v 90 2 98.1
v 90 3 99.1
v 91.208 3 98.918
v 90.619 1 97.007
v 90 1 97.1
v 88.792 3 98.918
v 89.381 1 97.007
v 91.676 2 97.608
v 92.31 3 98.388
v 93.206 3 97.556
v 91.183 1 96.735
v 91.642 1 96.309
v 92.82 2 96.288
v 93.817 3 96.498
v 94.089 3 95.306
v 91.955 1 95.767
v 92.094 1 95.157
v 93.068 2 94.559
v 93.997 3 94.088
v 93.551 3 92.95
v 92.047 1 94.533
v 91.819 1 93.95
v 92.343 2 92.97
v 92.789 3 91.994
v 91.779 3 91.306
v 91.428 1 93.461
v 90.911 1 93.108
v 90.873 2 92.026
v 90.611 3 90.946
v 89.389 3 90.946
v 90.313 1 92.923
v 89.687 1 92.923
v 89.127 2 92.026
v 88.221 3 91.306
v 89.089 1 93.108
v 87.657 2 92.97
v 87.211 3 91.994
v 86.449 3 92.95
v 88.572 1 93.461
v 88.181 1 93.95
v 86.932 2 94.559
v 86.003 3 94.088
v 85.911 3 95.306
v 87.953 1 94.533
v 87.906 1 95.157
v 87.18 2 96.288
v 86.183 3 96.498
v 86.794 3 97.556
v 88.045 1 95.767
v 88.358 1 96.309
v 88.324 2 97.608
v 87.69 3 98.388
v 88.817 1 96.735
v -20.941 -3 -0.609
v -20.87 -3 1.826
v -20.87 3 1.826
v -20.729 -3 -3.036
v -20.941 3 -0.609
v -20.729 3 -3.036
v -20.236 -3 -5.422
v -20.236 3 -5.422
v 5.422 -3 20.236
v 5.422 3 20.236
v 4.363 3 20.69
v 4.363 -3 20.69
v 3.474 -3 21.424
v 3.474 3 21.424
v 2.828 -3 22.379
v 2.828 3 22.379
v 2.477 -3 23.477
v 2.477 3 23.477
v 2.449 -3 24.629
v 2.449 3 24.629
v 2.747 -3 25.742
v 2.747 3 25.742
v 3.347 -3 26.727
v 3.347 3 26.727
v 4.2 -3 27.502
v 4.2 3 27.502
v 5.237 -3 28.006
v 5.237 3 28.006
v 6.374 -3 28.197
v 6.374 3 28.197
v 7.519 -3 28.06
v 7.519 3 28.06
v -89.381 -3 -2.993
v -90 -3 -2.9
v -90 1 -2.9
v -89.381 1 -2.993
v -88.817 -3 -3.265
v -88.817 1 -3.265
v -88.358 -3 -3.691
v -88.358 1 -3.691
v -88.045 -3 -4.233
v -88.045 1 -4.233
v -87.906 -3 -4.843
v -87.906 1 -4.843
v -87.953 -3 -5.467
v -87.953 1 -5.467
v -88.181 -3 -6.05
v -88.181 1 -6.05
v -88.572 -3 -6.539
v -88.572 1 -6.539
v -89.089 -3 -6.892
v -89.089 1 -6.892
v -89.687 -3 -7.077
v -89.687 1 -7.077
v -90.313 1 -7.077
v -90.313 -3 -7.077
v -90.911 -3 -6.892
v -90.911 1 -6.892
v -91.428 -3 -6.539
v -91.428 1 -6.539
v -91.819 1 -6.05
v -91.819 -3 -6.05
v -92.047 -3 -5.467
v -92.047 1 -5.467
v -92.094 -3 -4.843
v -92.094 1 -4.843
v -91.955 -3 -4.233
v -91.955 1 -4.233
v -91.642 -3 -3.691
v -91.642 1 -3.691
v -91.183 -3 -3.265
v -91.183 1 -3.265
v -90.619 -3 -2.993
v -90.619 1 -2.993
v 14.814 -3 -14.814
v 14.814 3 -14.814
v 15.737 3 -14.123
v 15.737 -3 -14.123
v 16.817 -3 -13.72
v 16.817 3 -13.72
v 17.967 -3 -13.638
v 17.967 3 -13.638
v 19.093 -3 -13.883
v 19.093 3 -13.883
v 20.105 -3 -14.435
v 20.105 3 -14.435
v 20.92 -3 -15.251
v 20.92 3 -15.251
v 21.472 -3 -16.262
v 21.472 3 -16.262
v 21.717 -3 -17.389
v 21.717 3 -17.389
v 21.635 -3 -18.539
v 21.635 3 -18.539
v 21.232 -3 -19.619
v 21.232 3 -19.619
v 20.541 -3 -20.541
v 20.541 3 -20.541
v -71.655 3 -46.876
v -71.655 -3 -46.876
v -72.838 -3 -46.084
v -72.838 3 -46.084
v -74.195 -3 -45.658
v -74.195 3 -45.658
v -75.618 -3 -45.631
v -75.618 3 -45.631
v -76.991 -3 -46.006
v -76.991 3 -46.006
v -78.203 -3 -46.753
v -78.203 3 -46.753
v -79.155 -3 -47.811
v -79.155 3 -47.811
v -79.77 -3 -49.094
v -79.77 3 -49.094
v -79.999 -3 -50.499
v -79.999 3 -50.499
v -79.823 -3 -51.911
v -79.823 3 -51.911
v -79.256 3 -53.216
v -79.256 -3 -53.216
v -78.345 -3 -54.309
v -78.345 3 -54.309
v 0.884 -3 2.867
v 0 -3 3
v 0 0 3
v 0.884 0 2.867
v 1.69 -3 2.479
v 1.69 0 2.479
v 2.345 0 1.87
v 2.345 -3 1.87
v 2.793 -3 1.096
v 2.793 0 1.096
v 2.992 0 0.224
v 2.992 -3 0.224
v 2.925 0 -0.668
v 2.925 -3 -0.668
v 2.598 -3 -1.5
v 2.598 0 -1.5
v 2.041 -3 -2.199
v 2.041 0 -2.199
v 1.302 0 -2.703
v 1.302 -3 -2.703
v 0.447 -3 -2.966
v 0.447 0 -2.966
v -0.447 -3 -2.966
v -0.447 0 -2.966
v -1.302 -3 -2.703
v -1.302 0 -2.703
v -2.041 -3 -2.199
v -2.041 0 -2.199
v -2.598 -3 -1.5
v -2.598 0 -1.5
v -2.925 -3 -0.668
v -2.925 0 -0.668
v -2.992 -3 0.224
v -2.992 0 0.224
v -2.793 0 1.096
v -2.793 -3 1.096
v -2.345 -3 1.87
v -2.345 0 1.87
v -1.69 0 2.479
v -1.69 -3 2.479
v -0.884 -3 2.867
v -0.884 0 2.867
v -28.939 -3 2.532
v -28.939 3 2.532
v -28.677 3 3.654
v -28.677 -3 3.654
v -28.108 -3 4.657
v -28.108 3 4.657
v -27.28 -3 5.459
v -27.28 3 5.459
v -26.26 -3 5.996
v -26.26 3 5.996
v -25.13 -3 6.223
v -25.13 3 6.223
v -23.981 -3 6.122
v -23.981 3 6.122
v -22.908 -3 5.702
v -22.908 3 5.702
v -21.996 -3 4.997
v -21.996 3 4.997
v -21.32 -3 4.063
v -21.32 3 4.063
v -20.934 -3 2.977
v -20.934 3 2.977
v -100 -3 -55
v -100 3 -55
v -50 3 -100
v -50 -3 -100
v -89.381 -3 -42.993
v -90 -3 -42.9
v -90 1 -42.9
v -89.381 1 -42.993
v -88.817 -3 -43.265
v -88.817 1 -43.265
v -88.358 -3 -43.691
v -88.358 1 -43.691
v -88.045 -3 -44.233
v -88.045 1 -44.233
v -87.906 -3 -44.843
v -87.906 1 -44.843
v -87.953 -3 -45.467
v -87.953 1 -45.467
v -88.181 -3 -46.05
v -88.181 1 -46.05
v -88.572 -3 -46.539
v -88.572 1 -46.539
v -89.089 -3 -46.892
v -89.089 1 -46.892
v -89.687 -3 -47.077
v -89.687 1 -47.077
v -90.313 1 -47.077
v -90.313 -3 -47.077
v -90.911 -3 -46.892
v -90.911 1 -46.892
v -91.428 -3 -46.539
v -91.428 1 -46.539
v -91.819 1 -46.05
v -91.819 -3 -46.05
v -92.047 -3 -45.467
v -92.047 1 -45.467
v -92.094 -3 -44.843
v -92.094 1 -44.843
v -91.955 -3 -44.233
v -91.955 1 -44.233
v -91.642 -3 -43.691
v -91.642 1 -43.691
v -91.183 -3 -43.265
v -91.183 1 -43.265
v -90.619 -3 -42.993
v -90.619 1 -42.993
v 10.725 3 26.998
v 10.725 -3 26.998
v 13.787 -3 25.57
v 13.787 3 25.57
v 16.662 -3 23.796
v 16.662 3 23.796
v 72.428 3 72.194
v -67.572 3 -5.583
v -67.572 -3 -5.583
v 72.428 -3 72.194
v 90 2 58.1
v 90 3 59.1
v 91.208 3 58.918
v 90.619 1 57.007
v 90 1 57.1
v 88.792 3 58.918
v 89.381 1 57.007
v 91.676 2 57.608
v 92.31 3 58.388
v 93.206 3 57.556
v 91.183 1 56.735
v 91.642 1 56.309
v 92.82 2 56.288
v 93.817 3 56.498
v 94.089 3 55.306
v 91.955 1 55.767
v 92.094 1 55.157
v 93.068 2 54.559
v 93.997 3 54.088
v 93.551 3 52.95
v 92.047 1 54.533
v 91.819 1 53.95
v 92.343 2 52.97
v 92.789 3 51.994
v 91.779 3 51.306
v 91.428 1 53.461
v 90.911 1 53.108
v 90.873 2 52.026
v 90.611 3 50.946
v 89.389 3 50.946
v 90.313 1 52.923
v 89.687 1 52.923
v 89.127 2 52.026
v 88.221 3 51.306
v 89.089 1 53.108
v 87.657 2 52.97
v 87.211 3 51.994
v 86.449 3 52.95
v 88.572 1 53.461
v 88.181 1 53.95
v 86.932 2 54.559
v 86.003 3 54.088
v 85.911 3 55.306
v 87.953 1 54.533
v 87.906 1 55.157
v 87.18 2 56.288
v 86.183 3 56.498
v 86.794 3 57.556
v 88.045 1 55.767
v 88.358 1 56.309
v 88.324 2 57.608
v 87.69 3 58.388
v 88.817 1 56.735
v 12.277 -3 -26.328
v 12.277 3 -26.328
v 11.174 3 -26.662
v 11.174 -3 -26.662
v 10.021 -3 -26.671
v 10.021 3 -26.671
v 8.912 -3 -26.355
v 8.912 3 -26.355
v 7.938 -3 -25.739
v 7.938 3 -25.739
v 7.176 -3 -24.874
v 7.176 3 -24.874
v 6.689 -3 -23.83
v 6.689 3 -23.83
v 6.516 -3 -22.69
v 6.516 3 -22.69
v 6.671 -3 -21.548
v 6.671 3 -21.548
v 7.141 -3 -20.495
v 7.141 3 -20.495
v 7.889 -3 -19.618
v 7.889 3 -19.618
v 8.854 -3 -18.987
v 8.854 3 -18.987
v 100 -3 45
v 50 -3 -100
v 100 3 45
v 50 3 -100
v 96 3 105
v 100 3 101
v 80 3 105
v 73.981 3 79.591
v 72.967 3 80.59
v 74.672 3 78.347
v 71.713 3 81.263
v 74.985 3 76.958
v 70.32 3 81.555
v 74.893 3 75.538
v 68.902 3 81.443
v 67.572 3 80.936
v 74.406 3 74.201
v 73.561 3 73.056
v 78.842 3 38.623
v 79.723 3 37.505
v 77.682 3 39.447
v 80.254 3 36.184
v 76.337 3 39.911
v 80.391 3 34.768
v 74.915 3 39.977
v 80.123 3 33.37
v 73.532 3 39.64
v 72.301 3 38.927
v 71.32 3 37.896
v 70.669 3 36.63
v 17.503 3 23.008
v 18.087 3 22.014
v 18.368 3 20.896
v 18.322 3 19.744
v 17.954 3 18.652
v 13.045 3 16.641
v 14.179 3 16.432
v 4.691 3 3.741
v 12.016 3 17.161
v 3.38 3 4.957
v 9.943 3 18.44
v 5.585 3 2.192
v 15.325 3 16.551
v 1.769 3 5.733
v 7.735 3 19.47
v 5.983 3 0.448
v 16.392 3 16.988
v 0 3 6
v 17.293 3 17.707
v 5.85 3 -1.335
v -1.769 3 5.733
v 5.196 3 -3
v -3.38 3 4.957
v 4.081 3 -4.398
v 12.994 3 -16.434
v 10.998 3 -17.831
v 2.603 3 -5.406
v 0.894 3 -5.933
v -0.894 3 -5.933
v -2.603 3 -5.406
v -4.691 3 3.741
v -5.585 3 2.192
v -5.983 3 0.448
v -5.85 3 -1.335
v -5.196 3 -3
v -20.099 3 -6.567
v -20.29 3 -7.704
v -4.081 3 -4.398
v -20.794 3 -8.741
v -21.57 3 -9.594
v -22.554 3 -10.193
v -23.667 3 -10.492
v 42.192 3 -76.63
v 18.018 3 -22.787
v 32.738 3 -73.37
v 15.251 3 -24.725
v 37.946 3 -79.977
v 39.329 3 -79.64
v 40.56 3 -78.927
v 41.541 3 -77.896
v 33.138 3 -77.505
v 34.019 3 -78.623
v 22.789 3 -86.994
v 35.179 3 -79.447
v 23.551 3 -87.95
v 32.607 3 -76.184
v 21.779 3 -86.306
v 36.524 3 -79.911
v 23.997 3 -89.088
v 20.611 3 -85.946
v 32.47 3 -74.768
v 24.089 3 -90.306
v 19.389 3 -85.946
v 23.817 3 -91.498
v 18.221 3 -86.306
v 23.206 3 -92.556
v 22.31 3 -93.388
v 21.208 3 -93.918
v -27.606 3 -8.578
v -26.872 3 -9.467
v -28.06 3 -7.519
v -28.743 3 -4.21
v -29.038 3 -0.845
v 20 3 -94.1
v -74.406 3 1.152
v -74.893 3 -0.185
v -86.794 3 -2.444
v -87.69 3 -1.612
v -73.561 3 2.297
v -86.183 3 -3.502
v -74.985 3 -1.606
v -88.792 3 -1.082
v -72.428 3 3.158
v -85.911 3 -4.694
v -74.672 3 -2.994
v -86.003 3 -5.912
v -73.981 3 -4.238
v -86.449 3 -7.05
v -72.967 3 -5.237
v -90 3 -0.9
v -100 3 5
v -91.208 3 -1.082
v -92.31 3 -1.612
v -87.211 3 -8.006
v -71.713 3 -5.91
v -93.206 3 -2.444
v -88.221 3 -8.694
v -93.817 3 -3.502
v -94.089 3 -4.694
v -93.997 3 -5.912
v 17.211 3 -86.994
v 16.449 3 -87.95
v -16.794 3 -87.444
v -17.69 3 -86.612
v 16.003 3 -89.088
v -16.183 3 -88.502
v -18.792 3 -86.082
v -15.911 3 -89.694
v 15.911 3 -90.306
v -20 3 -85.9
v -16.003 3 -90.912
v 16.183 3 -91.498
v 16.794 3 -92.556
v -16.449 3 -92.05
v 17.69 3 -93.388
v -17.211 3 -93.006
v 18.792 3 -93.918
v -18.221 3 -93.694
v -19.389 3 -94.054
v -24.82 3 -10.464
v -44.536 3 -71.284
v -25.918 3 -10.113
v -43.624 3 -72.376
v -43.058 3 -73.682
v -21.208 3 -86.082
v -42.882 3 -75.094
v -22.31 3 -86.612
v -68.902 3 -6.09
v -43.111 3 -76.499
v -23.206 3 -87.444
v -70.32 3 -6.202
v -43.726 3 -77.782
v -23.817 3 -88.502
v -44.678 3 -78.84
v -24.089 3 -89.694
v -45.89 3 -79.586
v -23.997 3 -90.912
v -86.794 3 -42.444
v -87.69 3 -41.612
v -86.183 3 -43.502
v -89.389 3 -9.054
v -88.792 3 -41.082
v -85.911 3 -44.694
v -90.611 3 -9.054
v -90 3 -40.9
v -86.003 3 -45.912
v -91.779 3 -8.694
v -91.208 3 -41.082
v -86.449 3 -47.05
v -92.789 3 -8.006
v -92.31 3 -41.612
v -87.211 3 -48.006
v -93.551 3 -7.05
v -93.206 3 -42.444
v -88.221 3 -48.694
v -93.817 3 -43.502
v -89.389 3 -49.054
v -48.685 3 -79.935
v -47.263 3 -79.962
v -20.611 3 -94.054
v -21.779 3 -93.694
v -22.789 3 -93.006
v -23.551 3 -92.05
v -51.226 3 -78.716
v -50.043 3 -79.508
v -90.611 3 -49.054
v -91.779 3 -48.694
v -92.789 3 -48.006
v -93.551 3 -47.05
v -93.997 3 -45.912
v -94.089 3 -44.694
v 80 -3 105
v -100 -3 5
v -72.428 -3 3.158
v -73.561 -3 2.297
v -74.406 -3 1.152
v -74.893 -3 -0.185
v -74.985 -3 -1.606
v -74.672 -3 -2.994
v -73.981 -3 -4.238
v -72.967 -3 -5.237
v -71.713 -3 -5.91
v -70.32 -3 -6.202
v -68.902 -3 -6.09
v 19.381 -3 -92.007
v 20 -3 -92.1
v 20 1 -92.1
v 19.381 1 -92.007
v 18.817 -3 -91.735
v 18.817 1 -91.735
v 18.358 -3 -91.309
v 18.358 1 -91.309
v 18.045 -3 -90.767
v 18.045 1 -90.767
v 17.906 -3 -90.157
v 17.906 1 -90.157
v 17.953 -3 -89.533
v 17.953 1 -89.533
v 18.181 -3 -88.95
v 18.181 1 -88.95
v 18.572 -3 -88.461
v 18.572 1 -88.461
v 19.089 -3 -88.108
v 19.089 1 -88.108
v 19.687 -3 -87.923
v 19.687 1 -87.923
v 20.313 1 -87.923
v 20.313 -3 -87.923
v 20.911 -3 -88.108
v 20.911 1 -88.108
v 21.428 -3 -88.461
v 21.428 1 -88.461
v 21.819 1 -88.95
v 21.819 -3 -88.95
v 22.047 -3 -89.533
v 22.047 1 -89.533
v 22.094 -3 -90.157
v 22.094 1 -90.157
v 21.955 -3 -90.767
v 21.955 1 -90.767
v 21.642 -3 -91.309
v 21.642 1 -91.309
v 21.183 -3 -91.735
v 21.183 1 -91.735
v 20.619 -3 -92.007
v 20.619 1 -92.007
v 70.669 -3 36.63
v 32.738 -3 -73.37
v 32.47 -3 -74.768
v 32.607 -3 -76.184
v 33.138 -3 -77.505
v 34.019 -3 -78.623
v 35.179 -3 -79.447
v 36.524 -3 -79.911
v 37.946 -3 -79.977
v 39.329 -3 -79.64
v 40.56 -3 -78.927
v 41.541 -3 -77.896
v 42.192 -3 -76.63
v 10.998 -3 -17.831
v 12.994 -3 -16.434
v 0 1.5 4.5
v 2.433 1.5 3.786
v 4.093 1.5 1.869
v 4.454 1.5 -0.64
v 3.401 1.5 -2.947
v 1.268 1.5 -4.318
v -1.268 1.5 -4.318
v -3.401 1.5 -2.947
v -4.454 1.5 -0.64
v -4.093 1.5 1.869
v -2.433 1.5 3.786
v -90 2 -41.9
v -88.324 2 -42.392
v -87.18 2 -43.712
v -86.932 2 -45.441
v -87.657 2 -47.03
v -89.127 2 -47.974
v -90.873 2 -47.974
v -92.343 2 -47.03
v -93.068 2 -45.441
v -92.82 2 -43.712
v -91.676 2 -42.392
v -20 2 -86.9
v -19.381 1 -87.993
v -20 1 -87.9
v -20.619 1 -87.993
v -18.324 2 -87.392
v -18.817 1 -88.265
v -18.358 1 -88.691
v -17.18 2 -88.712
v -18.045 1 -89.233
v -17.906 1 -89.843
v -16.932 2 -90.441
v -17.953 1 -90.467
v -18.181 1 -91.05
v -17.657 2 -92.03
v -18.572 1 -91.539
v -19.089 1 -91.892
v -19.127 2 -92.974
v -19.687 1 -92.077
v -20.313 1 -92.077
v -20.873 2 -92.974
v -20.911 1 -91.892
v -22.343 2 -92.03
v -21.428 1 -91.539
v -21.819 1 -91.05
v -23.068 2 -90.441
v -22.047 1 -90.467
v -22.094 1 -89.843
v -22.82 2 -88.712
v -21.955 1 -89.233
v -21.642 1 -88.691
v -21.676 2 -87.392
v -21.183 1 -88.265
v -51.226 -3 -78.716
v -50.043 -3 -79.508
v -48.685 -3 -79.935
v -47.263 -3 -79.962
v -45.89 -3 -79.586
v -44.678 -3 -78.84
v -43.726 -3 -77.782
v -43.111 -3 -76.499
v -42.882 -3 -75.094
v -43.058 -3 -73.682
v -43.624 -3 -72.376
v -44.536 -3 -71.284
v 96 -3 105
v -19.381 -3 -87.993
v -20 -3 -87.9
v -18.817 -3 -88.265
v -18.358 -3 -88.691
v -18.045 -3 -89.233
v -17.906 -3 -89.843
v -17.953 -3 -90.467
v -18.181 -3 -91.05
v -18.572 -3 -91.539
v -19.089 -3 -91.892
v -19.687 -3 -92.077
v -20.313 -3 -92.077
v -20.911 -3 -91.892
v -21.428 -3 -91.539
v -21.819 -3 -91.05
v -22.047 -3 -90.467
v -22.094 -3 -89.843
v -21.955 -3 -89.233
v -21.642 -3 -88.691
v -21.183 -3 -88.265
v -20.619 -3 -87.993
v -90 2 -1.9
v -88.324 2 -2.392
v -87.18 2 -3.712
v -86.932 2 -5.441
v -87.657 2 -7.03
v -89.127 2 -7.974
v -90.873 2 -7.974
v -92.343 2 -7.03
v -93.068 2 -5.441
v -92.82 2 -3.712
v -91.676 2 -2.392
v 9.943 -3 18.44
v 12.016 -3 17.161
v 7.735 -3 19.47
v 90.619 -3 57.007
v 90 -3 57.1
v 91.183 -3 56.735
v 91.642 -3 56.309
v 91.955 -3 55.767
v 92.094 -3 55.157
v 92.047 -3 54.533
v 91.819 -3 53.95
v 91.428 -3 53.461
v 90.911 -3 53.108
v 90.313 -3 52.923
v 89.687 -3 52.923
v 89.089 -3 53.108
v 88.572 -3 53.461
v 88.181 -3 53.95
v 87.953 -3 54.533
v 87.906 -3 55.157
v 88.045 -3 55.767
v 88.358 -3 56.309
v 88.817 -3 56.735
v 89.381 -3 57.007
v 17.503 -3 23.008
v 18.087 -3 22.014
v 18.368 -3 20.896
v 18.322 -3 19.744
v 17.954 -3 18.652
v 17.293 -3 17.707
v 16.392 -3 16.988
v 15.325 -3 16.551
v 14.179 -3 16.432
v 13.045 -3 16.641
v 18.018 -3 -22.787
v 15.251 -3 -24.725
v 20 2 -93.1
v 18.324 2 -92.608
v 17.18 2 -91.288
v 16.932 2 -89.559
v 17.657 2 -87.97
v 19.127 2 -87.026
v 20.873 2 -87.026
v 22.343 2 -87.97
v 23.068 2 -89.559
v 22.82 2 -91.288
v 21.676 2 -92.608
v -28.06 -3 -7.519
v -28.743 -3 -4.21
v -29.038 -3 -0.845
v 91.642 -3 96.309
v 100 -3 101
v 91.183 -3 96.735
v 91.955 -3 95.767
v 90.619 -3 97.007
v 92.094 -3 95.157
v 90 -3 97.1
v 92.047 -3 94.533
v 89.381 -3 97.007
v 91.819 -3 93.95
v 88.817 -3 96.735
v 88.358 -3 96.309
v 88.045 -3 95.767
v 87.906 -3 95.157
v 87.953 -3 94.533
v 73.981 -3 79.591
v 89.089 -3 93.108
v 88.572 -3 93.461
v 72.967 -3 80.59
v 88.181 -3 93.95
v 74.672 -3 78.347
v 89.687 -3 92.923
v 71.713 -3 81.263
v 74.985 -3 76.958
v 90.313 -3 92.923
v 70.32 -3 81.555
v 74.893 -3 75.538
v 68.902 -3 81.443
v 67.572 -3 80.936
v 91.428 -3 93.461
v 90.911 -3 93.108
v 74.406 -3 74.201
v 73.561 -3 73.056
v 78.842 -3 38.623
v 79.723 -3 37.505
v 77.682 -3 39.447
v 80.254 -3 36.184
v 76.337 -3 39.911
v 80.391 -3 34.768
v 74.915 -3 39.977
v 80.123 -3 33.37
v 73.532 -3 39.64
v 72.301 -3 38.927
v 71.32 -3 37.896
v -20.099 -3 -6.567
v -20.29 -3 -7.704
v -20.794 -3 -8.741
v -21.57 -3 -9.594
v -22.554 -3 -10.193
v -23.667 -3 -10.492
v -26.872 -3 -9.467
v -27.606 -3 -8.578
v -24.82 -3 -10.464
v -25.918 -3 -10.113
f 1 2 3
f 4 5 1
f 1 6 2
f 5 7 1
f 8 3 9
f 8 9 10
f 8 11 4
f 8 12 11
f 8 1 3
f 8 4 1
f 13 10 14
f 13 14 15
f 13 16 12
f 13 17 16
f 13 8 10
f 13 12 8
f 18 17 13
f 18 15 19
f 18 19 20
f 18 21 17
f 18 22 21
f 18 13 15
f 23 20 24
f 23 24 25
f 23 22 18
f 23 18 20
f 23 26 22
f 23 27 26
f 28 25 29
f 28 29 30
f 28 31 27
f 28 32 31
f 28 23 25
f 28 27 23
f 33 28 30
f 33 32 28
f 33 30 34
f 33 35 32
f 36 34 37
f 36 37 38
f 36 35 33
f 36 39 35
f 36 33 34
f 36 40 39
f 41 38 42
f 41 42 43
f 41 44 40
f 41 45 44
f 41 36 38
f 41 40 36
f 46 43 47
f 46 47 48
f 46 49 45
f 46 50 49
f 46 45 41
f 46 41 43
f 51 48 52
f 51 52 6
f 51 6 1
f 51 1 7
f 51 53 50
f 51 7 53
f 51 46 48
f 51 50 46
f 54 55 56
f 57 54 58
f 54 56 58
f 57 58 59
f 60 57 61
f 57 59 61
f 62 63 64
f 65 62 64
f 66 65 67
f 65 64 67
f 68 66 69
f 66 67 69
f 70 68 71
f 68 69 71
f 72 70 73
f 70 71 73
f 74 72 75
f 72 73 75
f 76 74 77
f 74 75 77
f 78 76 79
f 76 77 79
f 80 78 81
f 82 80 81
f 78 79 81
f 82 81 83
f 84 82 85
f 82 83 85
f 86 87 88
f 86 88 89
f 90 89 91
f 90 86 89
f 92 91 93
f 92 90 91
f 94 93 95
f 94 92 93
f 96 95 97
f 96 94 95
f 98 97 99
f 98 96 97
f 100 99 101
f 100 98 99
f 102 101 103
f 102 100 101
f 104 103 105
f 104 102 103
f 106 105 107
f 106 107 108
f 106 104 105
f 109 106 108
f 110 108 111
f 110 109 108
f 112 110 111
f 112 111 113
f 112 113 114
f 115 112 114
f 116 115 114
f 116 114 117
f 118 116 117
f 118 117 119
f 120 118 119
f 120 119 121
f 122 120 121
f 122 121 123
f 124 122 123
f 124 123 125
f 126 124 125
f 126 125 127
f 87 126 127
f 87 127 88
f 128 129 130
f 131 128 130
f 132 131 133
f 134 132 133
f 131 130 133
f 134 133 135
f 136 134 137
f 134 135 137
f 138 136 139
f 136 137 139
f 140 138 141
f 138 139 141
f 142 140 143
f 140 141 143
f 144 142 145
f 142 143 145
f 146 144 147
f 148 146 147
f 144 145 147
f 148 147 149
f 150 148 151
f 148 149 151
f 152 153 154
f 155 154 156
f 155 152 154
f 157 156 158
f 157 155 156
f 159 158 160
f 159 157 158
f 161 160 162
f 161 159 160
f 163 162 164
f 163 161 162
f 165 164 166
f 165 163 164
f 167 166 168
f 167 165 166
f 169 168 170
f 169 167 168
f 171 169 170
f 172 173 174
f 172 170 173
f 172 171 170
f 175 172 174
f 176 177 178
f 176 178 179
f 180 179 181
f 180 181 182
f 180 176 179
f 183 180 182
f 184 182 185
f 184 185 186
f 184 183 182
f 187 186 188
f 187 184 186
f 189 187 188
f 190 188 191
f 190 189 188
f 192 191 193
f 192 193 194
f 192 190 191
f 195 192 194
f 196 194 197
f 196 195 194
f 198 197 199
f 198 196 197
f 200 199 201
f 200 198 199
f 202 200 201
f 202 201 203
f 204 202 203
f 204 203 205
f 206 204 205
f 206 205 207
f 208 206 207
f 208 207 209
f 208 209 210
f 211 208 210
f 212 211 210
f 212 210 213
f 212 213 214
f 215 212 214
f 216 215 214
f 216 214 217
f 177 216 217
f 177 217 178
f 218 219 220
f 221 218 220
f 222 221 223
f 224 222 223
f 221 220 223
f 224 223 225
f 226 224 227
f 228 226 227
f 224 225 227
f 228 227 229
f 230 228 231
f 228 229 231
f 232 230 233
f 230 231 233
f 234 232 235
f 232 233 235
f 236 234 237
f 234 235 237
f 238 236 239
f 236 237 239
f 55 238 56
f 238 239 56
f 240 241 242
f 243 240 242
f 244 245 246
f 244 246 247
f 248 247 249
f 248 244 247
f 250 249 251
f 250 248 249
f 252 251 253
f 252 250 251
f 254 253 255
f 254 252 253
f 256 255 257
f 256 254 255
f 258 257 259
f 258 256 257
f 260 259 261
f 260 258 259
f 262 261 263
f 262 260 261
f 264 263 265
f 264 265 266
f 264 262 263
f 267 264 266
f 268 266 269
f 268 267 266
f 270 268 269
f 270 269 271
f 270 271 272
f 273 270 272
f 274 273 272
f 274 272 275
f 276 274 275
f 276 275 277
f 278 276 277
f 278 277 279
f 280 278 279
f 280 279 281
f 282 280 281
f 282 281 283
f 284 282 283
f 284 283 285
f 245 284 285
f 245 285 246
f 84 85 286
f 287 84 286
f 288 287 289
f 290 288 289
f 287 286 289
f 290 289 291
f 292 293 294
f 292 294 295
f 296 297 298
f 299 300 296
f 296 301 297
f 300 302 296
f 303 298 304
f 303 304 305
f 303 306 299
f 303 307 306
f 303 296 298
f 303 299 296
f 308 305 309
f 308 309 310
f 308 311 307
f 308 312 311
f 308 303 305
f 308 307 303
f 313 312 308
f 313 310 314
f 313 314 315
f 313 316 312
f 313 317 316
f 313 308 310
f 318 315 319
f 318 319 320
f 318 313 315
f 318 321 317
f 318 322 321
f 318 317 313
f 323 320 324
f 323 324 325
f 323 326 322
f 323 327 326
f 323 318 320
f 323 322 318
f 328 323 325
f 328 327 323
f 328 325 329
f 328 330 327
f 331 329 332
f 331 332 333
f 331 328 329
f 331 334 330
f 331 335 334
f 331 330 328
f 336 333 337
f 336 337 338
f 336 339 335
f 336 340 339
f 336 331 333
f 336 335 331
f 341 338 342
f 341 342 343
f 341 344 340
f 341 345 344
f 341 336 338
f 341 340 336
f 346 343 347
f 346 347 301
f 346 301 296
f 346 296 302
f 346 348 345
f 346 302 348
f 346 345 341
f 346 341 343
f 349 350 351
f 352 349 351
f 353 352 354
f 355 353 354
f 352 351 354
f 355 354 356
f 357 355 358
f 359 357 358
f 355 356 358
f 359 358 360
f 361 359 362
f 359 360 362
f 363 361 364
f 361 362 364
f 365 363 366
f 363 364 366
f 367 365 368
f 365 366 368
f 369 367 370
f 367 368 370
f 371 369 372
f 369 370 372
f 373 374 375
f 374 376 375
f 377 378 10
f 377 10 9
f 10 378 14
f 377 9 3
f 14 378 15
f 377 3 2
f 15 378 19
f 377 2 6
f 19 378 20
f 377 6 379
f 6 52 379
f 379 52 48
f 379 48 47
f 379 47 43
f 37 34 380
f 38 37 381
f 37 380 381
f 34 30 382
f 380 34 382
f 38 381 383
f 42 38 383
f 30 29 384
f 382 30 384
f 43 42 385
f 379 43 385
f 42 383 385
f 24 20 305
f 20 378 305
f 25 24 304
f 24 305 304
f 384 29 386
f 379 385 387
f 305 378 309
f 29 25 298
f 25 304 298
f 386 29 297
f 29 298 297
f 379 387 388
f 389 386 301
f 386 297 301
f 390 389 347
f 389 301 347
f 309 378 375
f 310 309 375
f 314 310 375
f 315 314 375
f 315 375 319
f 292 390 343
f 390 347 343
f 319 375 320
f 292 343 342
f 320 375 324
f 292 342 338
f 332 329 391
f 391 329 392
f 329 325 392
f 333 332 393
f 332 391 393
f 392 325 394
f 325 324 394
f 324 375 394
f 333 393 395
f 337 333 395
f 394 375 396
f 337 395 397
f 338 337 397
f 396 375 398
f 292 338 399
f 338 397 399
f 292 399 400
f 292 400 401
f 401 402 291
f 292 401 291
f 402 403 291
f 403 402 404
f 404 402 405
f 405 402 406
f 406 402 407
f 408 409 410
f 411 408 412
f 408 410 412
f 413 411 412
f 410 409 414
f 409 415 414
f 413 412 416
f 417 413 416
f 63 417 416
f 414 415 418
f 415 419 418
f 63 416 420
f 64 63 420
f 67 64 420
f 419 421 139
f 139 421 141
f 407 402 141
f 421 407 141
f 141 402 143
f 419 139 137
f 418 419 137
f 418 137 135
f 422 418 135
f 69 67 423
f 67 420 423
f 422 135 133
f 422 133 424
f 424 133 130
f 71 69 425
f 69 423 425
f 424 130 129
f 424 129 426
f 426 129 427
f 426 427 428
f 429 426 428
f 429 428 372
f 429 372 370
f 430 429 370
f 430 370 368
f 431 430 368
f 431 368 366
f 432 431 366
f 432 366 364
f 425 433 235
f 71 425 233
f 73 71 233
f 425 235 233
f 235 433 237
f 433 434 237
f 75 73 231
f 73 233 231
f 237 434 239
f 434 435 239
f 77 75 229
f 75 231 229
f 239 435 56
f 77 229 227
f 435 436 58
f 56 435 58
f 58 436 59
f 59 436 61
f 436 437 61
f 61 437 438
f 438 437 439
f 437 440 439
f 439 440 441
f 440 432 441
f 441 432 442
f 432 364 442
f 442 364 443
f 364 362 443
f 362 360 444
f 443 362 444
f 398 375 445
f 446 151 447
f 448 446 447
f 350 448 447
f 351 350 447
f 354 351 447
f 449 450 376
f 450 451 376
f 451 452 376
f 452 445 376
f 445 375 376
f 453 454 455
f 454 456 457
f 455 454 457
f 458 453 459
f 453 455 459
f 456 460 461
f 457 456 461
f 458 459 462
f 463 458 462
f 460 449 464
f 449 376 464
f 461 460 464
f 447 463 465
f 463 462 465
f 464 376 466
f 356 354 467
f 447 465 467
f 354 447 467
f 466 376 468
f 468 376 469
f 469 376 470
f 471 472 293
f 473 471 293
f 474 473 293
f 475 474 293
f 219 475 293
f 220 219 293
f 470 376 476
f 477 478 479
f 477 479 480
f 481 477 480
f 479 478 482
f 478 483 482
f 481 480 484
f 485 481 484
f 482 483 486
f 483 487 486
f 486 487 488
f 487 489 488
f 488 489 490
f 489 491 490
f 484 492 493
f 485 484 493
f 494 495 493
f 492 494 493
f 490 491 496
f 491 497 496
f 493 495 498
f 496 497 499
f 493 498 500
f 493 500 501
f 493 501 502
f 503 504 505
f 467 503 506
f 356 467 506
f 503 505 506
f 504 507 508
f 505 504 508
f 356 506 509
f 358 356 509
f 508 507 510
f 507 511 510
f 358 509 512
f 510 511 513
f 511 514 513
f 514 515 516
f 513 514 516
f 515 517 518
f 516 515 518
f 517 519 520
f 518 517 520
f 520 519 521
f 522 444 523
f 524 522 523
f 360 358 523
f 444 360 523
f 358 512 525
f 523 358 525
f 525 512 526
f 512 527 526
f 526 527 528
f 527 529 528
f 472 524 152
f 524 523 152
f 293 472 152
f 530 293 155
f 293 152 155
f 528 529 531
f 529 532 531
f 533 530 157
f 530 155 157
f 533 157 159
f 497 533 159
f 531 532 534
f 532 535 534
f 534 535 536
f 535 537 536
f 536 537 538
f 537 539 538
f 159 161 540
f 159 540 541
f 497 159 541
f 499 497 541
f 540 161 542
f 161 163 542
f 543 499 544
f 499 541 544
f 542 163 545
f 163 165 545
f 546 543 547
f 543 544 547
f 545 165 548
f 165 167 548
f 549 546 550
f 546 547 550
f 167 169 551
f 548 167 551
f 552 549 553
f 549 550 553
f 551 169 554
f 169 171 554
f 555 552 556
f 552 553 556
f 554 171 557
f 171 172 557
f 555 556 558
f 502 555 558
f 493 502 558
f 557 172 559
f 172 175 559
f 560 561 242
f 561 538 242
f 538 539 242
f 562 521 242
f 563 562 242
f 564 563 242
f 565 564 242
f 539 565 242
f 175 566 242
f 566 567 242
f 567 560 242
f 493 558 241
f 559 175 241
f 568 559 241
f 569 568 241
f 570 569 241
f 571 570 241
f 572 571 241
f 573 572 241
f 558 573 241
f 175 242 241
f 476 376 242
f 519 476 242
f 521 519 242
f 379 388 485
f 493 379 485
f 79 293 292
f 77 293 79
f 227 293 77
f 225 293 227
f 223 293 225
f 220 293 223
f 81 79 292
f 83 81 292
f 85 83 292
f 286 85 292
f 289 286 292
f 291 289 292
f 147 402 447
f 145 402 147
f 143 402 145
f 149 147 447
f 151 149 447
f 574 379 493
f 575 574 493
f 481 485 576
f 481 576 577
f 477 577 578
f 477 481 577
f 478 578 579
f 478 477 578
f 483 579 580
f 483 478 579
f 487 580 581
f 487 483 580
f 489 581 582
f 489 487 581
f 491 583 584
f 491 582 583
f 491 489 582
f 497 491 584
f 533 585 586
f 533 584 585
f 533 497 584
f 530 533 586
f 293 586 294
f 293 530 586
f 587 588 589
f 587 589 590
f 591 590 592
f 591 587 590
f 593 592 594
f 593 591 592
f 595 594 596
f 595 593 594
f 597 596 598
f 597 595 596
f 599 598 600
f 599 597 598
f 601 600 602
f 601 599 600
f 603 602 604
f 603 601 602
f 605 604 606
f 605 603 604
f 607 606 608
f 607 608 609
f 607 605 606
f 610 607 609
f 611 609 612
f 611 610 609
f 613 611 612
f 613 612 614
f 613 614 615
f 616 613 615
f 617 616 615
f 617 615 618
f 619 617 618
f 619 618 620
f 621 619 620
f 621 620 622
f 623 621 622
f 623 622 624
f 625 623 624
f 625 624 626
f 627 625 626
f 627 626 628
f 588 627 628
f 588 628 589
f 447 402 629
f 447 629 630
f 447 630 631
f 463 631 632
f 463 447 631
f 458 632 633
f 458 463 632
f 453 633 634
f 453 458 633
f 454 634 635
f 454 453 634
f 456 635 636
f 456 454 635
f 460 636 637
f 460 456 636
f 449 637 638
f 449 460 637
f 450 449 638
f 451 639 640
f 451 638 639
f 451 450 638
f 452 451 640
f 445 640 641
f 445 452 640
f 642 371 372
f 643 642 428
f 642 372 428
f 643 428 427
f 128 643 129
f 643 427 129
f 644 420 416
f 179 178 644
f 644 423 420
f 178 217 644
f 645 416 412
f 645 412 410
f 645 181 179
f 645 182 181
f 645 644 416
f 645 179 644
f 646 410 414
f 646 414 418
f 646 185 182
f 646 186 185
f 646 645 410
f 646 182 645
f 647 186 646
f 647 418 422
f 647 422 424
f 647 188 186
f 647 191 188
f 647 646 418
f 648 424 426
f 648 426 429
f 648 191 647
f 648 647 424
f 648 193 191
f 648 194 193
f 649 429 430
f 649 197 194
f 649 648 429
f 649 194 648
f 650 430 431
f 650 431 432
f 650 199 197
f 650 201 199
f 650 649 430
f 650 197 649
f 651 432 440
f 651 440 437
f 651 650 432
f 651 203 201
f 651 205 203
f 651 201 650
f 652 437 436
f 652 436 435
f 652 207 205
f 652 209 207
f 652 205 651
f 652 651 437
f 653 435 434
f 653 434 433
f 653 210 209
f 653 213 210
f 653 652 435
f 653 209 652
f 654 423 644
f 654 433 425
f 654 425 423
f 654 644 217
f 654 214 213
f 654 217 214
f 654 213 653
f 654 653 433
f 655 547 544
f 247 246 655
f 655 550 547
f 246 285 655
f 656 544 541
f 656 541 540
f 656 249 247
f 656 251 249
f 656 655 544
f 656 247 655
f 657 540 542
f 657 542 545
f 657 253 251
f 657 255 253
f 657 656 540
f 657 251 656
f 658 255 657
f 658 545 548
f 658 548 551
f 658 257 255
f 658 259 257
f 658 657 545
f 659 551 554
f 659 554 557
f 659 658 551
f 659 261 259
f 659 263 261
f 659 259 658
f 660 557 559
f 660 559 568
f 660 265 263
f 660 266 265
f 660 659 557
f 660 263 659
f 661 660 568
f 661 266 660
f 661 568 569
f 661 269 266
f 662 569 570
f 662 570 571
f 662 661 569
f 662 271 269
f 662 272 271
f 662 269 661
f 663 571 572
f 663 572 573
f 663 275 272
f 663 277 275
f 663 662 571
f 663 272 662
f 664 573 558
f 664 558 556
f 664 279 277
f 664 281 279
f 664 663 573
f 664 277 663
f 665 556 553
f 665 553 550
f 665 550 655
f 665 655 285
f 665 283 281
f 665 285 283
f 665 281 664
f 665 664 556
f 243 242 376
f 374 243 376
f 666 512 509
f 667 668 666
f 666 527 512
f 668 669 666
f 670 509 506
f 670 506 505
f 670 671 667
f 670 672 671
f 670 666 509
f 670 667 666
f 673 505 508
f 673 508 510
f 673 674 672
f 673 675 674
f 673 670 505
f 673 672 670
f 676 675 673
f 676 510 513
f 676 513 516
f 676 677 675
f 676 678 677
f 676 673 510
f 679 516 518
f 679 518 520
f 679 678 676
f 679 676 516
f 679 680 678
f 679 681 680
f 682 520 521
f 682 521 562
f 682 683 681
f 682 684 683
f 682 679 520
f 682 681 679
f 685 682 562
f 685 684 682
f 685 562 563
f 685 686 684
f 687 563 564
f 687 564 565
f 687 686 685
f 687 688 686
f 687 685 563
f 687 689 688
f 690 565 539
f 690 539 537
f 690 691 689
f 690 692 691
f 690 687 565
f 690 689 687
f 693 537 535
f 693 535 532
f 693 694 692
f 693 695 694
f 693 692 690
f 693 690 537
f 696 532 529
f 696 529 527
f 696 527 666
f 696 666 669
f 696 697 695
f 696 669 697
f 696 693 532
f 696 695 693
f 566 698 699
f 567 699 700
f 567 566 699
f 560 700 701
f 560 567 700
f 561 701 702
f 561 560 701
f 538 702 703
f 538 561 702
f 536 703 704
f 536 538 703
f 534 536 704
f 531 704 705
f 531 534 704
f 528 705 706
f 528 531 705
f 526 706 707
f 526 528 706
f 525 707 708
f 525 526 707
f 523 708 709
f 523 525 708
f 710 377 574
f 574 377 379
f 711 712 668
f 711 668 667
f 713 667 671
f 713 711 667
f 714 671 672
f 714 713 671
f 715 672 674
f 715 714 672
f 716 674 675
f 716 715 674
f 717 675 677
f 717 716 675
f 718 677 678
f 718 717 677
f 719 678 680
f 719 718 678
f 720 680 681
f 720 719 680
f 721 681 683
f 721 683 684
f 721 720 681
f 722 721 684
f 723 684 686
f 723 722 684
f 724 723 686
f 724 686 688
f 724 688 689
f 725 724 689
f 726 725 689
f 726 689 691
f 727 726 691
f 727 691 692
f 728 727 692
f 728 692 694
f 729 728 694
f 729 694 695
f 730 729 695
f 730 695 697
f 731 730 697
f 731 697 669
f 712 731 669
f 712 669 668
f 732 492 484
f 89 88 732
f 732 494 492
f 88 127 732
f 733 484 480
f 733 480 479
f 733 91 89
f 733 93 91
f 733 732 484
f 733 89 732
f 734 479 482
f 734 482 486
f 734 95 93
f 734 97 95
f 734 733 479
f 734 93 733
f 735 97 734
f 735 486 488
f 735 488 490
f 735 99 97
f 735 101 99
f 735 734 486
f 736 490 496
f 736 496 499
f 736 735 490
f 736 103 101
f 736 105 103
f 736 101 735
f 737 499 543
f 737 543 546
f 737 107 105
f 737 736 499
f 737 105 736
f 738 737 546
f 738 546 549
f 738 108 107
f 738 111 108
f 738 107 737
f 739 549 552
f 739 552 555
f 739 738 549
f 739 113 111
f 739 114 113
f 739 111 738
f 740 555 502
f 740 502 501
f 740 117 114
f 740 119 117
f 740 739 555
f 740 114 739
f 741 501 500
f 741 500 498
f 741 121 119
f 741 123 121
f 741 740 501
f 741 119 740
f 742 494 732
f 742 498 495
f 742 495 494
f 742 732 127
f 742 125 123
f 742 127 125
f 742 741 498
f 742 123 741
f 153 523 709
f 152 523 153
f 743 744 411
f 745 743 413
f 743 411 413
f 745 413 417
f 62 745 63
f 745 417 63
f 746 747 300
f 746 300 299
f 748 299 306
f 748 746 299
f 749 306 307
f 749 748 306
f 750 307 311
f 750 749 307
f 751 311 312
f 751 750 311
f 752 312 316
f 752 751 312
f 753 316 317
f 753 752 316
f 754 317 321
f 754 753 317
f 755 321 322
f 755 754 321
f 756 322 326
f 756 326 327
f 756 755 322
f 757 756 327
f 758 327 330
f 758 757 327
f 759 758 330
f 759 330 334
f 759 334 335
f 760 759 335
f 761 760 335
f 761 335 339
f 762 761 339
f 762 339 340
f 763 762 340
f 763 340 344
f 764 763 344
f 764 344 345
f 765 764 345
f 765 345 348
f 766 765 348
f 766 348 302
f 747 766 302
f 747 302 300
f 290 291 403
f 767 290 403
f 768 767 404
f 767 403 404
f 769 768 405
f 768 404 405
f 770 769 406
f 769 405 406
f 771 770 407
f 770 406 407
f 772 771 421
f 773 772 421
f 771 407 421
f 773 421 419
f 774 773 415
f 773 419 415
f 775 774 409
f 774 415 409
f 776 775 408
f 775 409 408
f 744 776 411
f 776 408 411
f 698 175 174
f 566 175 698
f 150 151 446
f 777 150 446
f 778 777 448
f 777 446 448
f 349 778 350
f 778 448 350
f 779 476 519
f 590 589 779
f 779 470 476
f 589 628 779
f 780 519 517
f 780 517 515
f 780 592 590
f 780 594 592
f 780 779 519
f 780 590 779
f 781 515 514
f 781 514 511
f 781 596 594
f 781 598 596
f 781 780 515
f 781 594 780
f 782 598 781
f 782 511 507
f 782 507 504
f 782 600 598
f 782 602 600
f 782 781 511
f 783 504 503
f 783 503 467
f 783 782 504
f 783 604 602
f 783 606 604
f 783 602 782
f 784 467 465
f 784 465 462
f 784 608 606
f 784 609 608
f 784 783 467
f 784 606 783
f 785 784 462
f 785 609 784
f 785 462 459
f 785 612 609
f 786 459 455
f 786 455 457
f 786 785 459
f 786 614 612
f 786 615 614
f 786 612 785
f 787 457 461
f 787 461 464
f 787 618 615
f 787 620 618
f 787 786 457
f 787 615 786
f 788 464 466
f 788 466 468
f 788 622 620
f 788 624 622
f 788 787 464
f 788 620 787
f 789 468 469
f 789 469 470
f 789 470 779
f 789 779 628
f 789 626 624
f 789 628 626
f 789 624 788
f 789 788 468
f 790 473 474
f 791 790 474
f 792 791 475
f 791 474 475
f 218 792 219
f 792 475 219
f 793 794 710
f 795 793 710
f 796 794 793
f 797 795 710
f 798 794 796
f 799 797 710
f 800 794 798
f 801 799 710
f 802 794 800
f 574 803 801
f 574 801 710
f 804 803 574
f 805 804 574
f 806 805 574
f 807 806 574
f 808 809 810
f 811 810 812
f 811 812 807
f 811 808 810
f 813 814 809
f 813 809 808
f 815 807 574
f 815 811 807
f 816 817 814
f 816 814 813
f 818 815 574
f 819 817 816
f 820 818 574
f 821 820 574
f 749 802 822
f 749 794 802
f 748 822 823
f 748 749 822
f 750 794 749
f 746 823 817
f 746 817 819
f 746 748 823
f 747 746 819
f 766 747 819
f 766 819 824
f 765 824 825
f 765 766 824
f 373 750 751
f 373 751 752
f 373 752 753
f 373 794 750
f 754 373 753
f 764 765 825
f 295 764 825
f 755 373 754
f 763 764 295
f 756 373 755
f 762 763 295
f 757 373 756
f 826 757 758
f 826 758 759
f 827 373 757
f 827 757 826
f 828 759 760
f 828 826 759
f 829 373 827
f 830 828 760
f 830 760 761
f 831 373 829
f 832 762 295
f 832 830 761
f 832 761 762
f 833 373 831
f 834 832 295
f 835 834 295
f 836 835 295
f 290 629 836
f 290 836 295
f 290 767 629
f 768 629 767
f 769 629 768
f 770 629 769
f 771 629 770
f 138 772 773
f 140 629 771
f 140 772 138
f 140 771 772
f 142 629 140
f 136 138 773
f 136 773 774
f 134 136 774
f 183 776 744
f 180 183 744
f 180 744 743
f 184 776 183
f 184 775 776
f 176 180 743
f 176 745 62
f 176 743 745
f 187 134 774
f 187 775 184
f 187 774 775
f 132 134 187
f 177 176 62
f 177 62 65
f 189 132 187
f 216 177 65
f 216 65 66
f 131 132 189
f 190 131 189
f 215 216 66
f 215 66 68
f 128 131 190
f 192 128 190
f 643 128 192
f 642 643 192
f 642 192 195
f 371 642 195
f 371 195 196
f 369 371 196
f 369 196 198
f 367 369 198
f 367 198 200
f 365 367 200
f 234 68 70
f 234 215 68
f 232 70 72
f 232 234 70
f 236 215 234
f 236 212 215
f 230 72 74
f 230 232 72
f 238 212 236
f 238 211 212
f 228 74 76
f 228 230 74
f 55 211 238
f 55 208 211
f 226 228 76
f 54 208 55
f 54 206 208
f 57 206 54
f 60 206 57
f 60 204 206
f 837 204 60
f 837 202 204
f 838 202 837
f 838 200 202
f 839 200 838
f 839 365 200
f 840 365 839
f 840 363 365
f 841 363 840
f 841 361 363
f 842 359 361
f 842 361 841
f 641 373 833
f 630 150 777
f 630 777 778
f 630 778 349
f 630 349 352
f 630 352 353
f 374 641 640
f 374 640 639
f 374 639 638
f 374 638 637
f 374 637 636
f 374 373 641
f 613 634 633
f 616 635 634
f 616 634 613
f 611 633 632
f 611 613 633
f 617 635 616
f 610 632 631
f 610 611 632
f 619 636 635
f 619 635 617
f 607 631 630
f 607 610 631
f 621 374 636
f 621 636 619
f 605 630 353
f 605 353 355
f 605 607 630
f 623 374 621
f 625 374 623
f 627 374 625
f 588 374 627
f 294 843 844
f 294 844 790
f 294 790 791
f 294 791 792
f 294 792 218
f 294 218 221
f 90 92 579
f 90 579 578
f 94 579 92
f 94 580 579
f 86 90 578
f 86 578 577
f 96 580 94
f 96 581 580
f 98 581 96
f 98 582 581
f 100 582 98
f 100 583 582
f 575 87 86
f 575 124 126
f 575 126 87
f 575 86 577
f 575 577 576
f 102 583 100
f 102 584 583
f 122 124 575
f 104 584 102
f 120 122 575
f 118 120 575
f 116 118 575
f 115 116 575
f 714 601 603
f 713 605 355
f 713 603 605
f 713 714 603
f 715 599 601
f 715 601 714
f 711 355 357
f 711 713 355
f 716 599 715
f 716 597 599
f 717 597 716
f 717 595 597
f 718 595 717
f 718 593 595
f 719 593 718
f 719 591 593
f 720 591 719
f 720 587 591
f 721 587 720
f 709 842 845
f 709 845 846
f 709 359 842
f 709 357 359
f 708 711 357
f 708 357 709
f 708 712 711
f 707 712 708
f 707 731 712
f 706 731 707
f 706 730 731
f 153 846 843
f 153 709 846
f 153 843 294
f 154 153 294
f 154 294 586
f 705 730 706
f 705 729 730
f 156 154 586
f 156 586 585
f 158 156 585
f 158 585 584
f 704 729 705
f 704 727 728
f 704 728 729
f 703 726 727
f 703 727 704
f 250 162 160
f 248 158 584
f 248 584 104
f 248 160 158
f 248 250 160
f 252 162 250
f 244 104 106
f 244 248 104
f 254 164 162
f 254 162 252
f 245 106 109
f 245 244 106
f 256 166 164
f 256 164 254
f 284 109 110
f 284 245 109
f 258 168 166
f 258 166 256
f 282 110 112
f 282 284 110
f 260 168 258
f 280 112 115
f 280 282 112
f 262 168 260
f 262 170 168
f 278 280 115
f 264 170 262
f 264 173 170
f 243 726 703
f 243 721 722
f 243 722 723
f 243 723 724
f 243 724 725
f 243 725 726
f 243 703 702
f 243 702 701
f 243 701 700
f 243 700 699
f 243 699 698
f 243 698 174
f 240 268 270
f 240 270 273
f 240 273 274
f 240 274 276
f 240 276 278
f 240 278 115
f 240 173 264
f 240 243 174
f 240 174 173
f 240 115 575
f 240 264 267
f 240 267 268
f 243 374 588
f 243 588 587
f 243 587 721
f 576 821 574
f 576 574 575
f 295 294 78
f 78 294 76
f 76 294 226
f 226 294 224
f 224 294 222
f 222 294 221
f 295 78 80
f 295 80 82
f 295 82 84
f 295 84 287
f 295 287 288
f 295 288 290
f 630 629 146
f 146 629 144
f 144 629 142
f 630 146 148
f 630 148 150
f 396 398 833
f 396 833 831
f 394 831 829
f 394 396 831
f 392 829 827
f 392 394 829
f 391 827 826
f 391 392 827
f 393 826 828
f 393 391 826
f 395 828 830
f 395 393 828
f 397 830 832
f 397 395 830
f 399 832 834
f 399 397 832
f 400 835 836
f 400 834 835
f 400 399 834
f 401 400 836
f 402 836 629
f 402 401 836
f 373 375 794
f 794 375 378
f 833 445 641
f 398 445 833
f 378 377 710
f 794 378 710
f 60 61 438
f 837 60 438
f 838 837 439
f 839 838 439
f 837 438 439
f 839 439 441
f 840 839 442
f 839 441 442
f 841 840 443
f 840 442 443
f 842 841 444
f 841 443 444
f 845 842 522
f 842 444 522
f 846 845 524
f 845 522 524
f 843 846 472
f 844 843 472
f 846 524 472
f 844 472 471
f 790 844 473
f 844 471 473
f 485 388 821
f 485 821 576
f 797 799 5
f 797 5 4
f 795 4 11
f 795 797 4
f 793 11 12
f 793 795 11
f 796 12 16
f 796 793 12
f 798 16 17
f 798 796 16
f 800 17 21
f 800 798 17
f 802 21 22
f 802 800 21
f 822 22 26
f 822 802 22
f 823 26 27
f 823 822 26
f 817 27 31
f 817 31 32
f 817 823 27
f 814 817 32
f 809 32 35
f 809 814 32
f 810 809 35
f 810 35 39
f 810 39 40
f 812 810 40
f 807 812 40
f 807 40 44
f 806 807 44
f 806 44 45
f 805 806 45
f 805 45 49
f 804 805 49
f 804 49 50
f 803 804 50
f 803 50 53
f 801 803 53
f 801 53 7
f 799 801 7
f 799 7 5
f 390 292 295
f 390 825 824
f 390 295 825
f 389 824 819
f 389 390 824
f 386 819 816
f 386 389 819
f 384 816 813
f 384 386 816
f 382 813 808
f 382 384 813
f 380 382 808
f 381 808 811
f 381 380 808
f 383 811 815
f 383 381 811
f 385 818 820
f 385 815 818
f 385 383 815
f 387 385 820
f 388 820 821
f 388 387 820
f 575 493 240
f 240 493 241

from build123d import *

# Parameters (mm, degrees)
SKETCH_1_R               = 3
SKETCH_1_R_2             = 2.1
EXTRUDE_1_DEPTH          = 3
CHAMFER_1_SIZE           = 2
CHAMFER_3_SIZE           = 4
CUT_EXTRUDE_1_DEPTH      = 146.124084838
CHAMFER_4_SIZE           = 3
CUT_EXTRUDE_2_DEPTH      = 146.124084838
PATTERN_CIRCULAR_1_COUNT = 3


with BuildPart() as part:
    # 草图1 → 凸台-拉伸1 (new, symmetric)
    with BuildSketch(Plane(origin=(0, 0, 0), x_dir=(1, 0, 0), z_dir=(0, 1, 0))):
        Polygon((-50, 100), (50, 100), (100, -45), (100, -105), (80, -105), (-100, -5), (-100, 55), align=None)
        with Locations(Location((0, 0, 0), (0, 0, 270))):
            Circle(SKETCH_1_R, mode=Mode.SUBTRACT)
        with Locations(Location((-20, 90, 0), (0, 0, 270))):
            Circle(SKETCH_1_R_2, mode=Mode.SUBTRACT)
        with Locations(Location((-90, 45, 0), (0, 0, 270))):
            Circle(SKETCH_1_R_2, mode=Mode.SUBTRACT)
        with Locations(Location((-90, 5, 0), (0, 0, 270))):
            Circle(SKETCH_1_R_2, mode=Mode.SUBTRACT)
        with Locations(Location((20, 90, 0), (0, 0, 90))):
            Circle(SKETCH_1_R_2, mode=Mode.SUBTRACT)
        with Locations(Location((90, -55, 0), (0, 0, 270))):
            Circle(SKETCH_1_R_2, mode=Mode.SUBTRACT)
        with Locations(Location((90, -95, 0), (0, 0, 270))):
            Circle(SKETCH_1_R_2, mode=Mode.SUBTRACT)
    extrude(amount=EXTRUDE_1_DEPTH, both=True)

    # 倒角1
    chamfer_1_edges = [part.edges().sort_by_distance(p)[0] for p in [
        (-20, 3, -92.1),
        (-90, 3, -47.1),
        (-90, 3, -7.1),
        (90, 3, 52.9),
        (90, 3, 92.9),
        (20, 3, -87.9),
    ]]
    chamfer(chamfer_1_edges, length=CHAMFER_1_SIZE)

    # 倒角3
    chamfer_3_edges = [part.edges().sort_by_distance(p)[0] for p in [
        (100, 0, 105),
    ]]
    chamfer(chamfer_3_edges, length=CHAMFER_3_SIZE)

    # 草图2 → 切除-拉伸1 (cut, through all)
    with BuildSketch(Plane(origin=(0, 3, 0), x_dir=(1, 0, 0), z_dir=(0, 1, 0))):
        with BuildLine():
            Line((-78.344823658, 54.309222637), (-51.225659109, 78.716470731))
            ThreePointArc((-51.225659109, 78.716470731), (-44.16436472, 78.344823658), (-44.536011793, 71.283529269))
            Line((-44.536011793, 71.283529269), (-71.655176342, 46.876281175))
            ThreePointArc((-71.655176342, 46.876281175), (-78.716470731, 47.247928248), (-78.344823658, 54.309222637))
        make_face()
        with BuildLine():
            Line((70.669187988, -36.629953417), (32.738153505, 73.370046583))
            ThreePointArc((32.738153505, 73.370046583), (35.835064997, 79.726864908), (42.191883322, 76.629953417))
            Line((42.191883322, 76.629953417), (80.122917804, -33.370046583))
            ThreePointArc((80.122917804, -33.370046583), (77.026006313, -39.726864908), (70.669187988, -36.629953417))
        make_face()
        with BuildLine():
            Line((67.571785344, -80.936052734), (-72.428214656, -3.158274956))
            ThreePointArc((-72.428214656, -3.158274956), (-74.370786381, 3.64072608), (-67.571785344, 5.583297805))
            Line((-67.571785344, 5.583297805), (72.428214656, -72.194479973))
            ThreePointArc((72.428214656, -72.194479973), (74.370786381, -78.993481009), (67.571785344, -80.936052734))
        make_face()
    extrude(amount=-CUT_EXTRUDE_1_DEPTH, mode=Mode.SUBTRACT)

    # 倒角4
    chamfer_4_edges = [part.edges().sort_by_distance(p)[0] for p in [
        (0, 3, -3),
    ]]
    chamfer(chamfer_4_edges, length=CHAMFER_4_SIZE)

    # 草图3 → 切除-拉伸2 (cut, through all)
    with BuildSketch(Plane(origin=(0, 3, 0), x_dir=(1, 0, 0), z_dir=(0, 1, 0))):
        with BuildLine():
            ThreePointArc((20.541451993, 20.541451993), (16.662395476, 23.796366887), (12.277060504, 26.328241213))
            ThreePointArc((12.277060504, 26.328241213), (6.894910006, 24.369298636), (8.853852583, 18.987148138))
            ThreePointArc((8.853852583, 18.987148138), (12.016426342, 17.161235328), (14.813887066, 14.813887066))
            ThreePointArc((14.813887066, 14.813887066), (20.541451993, 14.813887066), (20.541451993, 20.541451993))
        make_face()
    cut_extrude_2 = extrude(amount=-CUT_EXTRUDE_2_DEPTH, mode=Mode.SUBTRACT)

    # 阵列(圆周)1: 切除-拉伸2 ×3 about axis
    pattern_circular_1_axis = Axis((0, 0, 0), (0, 1, 0))
    for i in range(1, PATTERN_CIRCULAR_1_COUNT):
        add(cut_extrude_2.rotate(pattern_circular_1_axis, i * 360 / PATTERN_CIRCULAR_1_COUNT), mode=Mode.SUBTRACT)


solid = part.part
